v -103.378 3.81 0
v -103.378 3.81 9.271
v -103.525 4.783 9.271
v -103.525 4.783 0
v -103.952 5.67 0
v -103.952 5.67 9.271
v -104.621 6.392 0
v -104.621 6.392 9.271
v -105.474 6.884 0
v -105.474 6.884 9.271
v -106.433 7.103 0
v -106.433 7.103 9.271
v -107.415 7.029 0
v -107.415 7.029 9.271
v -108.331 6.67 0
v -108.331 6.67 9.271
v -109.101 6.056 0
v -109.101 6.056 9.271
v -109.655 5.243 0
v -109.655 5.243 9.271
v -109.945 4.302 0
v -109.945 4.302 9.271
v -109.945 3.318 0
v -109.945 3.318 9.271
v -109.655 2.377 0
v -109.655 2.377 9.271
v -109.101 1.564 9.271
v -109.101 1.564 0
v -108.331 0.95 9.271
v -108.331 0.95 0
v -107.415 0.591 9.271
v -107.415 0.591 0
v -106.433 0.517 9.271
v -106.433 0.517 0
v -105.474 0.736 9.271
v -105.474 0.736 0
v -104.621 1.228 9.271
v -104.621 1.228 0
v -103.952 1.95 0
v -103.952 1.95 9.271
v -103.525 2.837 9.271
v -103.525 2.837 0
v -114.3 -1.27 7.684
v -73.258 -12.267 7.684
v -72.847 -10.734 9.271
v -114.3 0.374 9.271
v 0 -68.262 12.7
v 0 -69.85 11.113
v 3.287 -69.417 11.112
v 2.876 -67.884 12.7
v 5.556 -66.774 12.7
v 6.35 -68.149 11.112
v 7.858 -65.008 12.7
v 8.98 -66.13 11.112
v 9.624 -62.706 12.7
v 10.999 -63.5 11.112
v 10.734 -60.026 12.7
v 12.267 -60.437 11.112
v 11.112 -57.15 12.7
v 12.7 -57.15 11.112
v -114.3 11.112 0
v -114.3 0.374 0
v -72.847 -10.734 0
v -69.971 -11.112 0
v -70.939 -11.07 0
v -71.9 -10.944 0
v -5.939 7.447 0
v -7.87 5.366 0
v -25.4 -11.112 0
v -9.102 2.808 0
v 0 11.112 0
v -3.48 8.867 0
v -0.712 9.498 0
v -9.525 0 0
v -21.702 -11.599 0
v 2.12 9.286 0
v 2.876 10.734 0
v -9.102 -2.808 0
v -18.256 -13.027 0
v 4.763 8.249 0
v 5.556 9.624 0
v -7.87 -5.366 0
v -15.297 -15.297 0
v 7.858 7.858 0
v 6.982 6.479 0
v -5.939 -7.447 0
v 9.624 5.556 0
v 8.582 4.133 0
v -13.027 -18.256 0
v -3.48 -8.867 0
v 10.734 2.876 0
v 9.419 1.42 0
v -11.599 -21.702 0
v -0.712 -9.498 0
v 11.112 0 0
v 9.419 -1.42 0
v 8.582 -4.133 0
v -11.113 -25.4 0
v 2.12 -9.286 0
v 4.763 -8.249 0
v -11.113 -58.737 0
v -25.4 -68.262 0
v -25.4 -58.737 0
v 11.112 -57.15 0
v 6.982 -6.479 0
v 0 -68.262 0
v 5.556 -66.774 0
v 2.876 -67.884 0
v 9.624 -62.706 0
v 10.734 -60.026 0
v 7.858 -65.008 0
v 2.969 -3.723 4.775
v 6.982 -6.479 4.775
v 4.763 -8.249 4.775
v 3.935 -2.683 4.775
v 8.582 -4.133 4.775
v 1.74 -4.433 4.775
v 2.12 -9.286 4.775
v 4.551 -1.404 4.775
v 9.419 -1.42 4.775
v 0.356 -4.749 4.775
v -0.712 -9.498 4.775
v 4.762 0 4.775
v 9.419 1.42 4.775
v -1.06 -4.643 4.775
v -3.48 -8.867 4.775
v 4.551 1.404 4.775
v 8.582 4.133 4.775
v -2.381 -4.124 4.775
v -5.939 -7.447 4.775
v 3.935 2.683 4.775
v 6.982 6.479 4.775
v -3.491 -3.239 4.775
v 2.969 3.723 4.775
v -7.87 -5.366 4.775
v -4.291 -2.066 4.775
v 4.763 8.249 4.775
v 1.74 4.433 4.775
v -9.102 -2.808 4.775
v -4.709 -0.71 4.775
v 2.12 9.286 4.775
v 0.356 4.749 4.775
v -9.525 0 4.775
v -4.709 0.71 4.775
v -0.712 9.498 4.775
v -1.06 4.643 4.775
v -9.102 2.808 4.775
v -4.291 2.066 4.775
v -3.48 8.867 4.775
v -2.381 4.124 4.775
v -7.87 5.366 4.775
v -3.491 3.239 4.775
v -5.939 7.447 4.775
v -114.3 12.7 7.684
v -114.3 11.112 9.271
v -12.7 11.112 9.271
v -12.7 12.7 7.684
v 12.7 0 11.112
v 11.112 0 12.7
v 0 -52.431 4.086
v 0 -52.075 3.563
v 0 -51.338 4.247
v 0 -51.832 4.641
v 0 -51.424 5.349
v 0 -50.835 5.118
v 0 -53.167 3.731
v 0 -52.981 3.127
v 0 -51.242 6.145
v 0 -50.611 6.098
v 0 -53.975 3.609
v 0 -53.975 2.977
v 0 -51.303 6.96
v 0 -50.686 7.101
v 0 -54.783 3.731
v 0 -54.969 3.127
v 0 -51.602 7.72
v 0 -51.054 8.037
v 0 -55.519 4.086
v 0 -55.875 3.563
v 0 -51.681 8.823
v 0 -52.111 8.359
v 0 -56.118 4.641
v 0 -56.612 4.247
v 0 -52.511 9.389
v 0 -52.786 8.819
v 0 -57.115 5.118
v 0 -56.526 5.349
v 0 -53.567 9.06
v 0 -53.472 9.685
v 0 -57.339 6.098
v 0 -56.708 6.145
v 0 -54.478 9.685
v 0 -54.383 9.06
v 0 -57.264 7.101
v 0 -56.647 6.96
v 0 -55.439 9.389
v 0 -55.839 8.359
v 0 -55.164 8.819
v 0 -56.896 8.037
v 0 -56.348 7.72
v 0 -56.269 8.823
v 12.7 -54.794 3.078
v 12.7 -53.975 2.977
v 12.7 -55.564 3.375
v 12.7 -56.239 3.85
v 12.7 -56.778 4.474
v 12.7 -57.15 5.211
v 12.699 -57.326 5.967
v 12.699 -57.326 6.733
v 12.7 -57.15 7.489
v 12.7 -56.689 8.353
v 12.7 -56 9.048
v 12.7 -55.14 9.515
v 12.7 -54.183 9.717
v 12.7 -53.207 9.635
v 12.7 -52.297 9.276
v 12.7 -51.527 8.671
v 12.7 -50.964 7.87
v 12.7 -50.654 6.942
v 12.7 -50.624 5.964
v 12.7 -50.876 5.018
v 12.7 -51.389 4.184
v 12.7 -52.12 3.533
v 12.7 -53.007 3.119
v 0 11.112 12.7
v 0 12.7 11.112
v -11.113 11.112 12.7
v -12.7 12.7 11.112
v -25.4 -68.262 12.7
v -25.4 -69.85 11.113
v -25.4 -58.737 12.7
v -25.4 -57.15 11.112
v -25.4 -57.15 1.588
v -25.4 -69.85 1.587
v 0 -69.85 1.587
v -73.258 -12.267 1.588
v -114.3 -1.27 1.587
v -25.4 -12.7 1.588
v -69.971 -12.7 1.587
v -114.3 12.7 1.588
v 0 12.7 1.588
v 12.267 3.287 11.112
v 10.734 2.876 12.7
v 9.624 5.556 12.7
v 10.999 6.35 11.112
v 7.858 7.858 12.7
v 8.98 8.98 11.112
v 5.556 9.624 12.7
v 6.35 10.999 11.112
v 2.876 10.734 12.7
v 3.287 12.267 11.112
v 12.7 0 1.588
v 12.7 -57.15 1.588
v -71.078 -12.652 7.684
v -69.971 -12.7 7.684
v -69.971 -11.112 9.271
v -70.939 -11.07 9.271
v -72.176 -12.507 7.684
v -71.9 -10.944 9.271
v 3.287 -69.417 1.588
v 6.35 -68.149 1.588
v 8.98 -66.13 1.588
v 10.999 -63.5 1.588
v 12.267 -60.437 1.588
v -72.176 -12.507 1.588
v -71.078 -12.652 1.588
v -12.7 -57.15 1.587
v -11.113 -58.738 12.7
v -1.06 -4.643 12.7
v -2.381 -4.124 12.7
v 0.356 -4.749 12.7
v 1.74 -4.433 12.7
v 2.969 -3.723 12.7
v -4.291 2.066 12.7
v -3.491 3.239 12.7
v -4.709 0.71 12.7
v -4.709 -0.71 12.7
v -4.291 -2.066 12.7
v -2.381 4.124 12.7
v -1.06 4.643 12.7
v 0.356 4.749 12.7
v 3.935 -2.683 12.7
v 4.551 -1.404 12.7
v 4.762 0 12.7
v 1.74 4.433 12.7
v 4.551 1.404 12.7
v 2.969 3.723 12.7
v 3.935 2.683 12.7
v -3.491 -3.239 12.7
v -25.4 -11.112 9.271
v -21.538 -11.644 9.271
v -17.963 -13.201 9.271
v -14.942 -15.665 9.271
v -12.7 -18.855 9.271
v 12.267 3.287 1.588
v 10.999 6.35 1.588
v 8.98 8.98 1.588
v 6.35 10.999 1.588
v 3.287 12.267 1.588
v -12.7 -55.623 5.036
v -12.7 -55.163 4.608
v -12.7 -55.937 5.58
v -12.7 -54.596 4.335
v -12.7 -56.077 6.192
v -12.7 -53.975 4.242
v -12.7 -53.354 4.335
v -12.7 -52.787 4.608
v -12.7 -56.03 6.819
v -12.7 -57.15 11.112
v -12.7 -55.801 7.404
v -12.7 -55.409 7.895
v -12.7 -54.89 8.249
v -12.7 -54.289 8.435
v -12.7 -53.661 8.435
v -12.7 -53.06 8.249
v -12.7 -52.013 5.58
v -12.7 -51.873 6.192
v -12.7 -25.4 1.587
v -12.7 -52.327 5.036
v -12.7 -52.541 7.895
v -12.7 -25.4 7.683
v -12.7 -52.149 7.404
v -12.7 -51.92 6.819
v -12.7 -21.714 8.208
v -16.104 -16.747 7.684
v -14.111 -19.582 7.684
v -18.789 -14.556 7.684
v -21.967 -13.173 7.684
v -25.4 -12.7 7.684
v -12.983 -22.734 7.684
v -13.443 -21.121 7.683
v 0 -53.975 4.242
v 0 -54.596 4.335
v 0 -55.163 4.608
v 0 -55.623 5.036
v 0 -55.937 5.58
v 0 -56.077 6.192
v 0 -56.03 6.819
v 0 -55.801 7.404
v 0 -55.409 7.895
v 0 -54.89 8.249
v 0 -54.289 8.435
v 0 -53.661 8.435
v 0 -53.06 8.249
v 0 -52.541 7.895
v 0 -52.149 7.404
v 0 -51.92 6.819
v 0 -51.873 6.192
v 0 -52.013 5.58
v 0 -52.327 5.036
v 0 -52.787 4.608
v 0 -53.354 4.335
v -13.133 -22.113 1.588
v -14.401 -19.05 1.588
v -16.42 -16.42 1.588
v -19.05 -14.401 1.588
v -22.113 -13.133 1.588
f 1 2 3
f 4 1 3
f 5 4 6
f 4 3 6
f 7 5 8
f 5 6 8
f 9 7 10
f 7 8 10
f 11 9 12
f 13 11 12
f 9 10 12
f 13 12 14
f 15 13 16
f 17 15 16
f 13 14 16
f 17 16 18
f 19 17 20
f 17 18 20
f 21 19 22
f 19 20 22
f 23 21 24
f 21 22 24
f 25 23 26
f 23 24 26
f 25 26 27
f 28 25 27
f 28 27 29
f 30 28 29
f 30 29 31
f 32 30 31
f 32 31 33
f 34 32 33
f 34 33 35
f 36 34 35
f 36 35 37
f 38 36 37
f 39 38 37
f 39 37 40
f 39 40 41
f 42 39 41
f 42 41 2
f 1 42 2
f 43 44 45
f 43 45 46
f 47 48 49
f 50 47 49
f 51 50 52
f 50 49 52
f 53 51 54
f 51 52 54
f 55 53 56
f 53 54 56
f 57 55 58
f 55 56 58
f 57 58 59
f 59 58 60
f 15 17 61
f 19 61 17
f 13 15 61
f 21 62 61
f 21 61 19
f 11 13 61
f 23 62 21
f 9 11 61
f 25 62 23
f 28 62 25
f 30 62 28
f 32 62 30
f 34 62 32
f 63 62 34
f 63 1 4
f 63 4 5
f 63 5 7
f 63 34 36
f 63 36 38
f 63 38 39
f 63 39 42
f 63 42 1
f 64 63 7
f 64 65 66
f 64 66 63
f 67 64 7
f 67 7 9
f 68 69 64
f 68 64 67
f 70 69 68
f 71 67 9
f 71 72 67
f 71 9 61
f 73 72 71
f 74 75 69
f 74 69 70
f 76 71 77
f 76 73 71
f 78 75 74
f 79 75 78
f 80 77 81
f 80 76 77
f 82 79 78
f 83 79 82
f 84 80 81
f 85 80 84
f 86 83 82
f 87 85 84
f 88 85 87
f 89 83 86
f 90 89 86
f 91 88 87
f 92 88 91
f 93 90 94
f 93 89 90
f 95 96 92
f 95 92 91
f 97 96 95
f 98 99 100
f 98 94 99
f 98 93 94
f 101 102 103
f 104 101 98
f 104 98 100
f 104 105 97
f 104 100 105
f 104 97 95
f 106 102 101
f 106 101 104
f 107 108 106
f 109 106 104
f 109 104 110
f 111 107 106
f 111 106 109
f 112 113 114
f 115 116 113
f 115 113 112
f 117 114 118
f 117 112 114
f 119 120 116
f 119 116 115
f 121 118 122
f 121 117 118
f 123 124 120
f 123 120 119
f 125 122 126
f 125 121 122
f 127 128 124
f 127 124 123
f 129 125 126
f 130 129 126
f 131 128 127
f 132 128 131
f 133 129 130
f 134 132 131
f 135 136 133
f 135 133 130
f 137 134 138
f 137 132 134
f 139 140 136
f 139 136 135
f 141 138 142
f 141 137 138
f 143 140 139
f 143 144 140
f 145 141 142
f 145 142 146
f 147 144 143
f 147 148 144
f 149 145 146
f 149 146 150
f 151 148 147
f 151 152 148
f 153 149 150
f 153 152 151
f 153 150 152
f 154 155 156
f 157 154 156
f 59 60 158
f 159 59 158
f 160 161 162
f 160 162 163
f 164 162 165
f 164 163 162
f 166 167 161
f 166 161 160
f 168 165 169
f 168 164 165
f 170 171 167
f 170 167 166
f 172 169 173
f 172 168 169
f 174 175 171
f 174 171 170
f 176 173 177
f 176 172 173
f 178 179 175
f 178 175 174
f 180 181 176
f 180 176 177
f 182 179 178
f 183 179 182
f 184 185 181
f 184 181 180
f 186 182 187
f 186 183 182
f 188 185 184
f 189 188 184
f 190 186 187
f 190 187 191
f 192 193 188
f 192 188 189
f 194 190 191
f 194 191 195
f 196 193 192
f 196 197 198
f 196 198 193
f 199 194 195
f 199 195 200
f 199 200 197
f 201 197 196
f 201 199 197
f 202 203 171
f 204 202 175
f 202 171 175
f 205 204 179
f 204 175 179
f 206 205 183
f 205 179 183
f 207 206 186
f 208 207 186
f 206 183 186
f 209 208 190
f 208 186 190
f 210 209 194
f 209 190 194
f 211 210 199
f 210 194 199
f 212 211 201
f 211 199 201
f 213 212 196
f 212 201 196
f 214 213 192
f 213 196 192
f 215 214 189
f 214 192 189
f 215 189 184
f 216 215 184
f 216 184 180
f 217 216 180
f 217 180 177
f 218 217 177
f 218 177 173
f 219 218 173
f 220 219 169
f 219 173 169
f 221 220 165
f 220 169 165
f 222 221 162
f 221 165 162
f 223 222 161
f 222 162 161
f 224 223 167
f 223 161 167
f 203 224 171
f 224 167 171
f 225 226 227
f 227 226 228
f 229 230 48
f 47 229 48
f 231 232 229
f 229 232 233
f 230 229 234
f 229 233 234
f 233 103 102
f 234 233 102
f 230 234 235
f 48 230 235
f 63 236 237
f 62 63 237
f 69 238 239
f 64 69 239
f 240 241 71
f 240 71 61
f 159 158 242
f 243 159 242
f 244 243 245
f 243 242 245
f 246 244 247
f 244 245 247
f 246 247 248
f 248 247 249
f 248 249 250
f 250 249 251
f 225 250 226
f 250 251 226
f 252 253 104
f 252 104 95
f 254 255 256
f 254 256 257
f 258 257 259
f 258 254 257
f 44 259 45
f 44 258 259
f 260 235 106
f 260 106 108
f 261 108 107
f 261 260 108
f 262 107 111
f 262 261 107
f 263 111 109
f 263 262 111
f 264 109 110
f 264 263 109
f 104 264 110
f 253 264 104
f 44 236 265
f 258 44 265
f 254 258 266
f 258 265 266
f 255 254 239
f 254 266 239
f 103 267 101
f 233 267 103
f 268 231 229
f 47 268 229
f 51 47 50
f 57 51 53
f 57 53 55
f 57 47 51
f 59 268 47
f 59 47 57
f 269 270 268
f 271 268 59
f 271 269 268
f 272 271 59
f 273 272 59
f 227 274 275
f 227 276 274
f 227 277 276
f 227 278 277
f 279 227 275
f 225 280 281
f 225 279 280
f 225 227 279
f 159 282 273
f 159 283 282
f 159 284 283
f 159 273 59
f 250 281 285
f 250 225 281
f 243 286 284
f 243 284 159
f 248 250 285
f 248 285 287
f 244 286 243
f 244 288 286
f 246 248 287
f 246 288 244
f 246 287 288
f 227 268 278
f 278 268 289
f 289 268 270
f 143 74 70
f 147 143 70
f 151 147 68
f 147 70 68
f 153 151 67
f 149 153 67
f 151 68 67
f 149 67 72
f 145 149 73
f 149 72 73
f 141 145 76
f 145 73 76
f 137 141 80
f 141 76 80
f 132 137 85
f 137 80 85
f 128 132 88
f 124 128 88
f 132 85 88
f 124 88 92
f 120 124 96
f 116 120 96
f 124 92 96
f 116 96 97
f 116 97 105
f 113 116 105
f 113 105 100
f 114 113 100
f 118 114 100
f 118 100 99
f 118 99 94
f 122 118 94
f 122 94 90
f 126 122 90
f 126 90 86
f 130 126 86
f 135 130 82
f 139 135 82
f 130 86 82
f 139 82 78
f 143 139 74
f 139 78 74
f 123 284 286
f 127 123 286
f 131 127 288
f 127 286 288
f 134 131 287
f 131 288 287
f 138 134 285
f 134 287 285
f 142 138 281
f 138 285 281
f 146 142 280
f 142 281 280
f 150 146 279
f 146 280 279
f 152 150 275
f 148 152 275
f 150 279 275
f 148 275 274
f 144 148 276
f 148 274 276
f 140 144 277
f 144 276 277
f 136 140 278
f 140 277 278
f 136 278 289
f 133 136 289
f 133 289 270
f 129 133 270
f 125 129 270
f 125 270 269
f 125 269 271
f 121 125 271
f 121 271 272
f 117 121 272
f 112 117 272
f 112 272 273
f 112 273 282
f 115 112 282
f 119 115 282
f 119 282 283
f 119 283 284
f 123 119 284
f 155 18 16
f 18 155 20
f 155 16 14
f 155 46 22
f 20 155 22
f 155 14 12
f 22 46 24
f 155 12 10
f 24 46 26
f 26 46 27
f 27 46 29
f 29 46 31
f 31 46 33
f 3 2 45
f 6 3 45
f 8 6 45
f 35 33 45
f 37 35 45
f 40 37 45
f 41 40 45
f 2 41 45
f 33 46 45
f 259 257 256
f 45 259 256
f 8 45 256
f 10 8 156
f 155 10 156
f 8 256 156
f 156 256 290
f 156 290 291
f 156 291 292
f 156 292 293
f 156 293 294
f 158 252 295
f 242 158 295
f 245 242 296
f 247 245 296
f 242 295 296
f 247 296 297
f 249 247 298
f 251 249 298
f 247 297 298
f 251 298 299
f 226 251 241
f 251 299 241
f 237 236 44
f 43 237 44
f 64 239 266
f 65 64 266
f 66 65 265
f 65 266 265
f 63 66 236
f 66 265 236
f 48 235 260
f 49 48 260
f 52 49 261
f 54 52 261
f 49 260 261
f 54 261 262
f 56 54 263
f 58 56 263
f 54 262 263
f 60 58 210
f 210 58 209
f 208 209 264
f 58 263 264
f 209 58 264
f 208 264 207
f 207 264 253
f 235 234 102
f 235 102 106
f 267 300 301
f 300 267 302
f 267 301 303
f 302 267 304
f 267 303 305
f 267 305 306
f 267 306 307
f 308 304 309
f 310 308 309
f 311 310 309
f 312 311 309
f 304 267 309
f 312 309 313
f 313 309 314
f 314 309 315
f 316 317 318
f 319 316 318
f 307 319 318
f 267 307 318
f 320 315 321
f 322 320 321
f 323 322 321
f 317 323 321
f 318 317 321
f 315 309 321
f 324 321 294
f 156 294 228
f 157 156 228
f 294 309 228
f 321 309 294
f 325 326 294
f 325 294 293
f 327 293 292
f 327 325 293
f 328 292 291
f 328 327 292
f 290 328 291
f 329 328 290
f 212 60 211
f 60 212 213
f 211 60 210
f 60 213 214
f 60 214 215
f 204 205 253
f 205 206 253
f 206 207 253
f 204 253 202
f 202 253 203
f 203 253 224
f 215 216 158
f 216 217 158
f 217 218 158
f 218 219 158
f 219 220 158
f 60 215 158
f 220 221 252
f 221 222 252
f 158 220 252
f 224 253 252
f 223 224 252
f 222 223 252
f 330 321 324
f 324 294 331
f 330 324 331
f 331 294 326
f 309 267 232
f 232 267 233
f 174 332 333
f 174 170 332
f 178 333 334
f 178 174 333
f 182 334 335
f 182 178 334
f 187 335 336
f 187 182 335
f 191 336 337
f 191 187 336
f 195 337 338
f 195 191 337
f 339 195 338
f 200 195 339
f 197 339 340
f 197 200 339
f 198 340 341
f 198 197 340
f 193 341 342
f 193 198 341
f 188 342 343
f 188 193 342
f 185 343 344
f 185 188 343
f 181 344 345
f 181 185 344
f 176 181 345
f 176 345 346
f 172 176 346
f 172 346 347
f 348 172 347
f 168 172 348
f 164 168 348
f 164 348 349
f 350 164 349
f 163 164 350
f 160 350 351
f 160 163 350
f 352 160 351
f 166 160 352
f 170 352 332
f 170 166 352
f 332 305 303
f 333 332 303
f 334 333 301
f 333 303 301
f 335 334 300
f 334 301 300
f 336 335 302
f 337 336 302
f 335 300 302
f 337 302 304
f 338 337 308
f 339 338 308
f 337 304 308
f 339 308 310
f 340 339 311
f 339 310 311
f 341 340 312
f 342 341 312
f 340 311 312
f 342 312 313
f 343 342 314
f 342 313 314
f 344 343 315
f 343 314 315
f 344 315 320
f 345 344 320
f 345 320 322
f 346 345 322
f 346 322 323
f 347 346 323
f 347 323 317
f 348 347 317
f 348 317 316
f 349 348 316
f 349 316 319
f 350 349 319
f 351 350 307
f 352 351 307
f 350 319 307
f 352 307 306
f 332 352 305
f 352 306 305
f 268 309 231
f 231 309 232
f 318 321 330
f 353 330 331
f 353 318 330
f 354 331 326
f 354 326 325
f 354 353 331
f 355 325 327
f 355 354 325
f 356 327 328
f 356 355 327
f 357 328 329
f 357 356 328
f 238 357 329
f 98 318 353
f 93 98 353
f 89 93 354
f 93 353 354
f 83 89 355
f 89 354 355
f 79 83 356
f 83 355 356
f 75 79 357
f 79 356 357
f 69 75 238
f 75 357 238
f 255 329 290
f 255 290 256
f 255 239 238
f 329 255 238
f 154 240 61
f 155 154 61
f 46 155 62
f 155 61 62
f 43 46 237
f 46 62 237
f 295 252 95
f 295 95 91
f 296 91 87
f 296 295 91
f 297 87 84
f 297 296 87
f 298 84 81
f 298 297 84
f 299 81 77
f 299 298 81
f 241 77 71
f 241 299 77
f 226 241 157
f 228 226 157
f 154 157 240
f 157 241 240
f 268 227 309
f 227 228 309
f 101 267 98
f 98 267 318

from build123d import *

# Parameters (mm, degrees)
BASE_EXTRUDE_DEPTH = 12.7
SKETCH2_R          = 4.7625
CUT_EXTRUDE1_DEPTH = 135.554087638
SKETCH3_R          = 3.302
CUT_EXTRUDE2_DEPTH = 106.159296474
CHAMFER1_SIZE      = 11.43
CHAMFER1_SIZE2     = 42.657340731
SKETCH5_W          = 101.6
SKETCH5_H          = 25.4
CUT_EXTRUDE4_DEPTH = 3.429
FILLET2_R          = 12.7
CHAMFER2_SIZE      = 1.5875
CHAMFER3_SIZE      = 1.5875
SKETCH8_R          = 9.525
CUT_EXTRUDE5_DEPTH = 4.7752


with BuildPart() as part:
    # Sketch1 → Base-Extrude (new body)
    with BuildSketch(Plane.XY):
        Polygon((-114.3, 12.7), (-114.3, -12.7), (-12.7, -12.7), (-12.7, -57.15), (-25.4, -57.15), (-25.4, -69.85), (12.7, -69.85), (12.7, 12.7), align=None)
    extrude(amount=BASE_EXTRUDE_DEPTH)

    # Sketch2 → Cut-Extrude1 (cut, through all)
    with BuildSketch(Plane.XY.offset(12.7)):
        Circle(SKETCH2_R)
    extrude(amount=-CUT_EXTRUDE1_DEPTH, mode=Mode.SUBTRACT)

    # Sketch3 → Cut-Extrude2 (cut, through all)
    with BuildSketch(Plane(origin=(-40.826123223, 4.303739396, 12.7), x_dir=(1, 0, 0), z_dir=(0, 0, 1))):
        with Locations((-65.853876777, -0.493739396)):
            Circle(SKETCH3_R)
    extrude(amount=-CUT_EXTRUDE2_DEPTH, mode=Mode.SUBTRACT)

    # Chamfer1
    chamfer1_edges = [part.edges().sort_by_distance(p)[0] for p in [
        (-114.3, -12.7, 6.35),
    ]]
    chamfer1_side = [part.faces().sort_by_distance(p)[0] for p in [
        (-114.3, 0, 6.35),
    ]]
    chamfer(chamfer1_edges, length=CHAMFER1_SIZE, length2=CHAMFER1_SIZE2, reference=chamfer1_side[0])

    # Sketch5 → Cut-Extrude4 (cut)
    with BuildSketch(Plane(origin=(-65.557986772, -0.200650606, 12.7), x_dir=(1, 0, 0), z_dir=(0, 0, 1))):
        with Locations((2.057986772, 0.200650606)):
            Rectangle(SKETCH5_W, SKETCH5_H)
    extrude(amount=-CUT_EXTRUDE4_DEPTH, mode=Mode.SUBTRACT)

    # Sketch7 → Hole1 (revolve, cut)
    with BuildSketch(Plane(origin=(12.7, -53.975, 6.35), x_dir=(0, 0, -1), z_dir=(0, 1, 0))):
        Polygon((0, 0), (0, 127), (2.108198174, 127), (2.108198174, 126.997460002), (2.108198174, 12.699989143), (2.740657626, 12.699989), (3.373117078, 12.699989), (3.373117078, 6.3499945), (3.373117078, 0), align=None)
    revolve(axis=Axis((12.7, -53.975, 6.35), (-1, 0, 0)), mode=Mode.SUBTRACT)

    # Fillet2
    # the kernel refuses this fillet: 12.7 mm, written as the material it adds along each edge
    with BuildSketch(Plane(origin=(-12.7, -12.7, 0), x_dir=(-1, 0, 0), z_dir=(0, 0, 1))) as fillet2_piece_1:
        with BuildLine():
            CenterArc((FILLET2_R, FILLET2_R), FILLET2_R, 180, 90)
            Line((0, FILLET2_R), (0, 0))
            Line((0, 0), (FILLET2_R, 0))
        make_face()
    extrude(amount=9.271)
    # the kernel refuses this fillet: 12.7 mm, written as the material it takes off along each edge
    with BuildSketch(Plane(origin=(12.7, 12.7, -31.75), x_dir=(0, -1, 0), z_dir=(0, 0, 1))) as fillet2_2_piece_1:
        with BuildLine():
            CenterArc((FILLET2_R, -FILLET2_R), FILLET2_R, 90, 90)
            Line((0, -FILLET2_R), (0, 0))
            Line((0, 0), (FILLET2_R, 0))
        make_face()
    extrude(amount=76.2, mode=Mode.SUBTRACT)
    with BuildSketch(Plane(origin=(12.7, -69.85, -31.75), x_dir=(0, 1, 0), z_dir=(0, 0, 1))) as fillet2_2_piece_2:
        with BuildLine():
            CenterArc((FILLET2_R, FILLET2_R), FILLET2_R, 180, 90)
            Line((0, FILLET2_R), (0, 0))
            Line((0, 0), (FILLET2_R, 0))
        make_face()
    extrude(amount=76.2, mode=Mode.SUBTRACT)
    with BuildSketch(Plane(origin=(-71.642659269, -12.7, -4.179966798), x_dir=(1, 0, 0), z_dir=(0, 0, 1))) as fillet2_2_piece_3:
        with BuildLine():
            CenterArc((FILLET2_R * 0.131652497587, FILLET2_R), FILLET2_R, 255, 15)
            Line((-FILLET2_R * 0.127166547515, FILLET2_R * 0.0340741737109), (0, 0))
            Line((0, 0), (FILLET2_R * 0.131652497587, 0))
        make_face()
    extrude(amount=17.630933597, mode=Mode.SUBTRACT)

    # Chamfer2
    chamfer2_edges = [part.edges().sort_by_distance(p)[0] for p in [
        (-57.15, 12.7, 0),
        (12.7, -28.575, 0),
        (-12.7, -69.85, 0),
        (8.980256121, -66.130256121, 0),
        (8.980256121, 8.980256121, 0),
    ]]
    chamfer(chamfer2_edges, length=CHAMFER2_SIZE)

    # Chamfer3
    chamfer3_edges = [part.edges().sort_by_distance(p)[0] for p in [
        (-19.05, -57.15, 0),
    ]]
    chamfer(chamfer3_edges, length=CHAMFER3_SIZE)
    chamfer3_2_edges = [part.edges().sort_by_distance(p)[0] for p in [
        (-12.7, -41.275, 0),
        (-16.419743879, -16.419743879, 0),
        (-47.685336275, -12.7, 0),
        (-71.628355191, -12.591349739, 0),
        (-93.778837211, -6.768628997, 0),
    ]]
    chamfer(chamfer3_2_edges, length=CHAMFER3_SIZE)
    chamfer3_3_edges = [part.edges().sort_by_distance(p)[0] for p in [
        (-19.05, -57.15, 12.7),
    ]]
    chamfer(chamfer3_3_edges, length=CHAMFER3_SIZE)
    chamfer3_4_edges = [part.edges().sort_by_distance(p)[0] for p in [
        (-12.7, -22.225, 12.7),
    ]]
    chamfer(chamfer3_4_edges, length=CHAMFER3_SIZE)
    chamfer3_5_edges = [part.edges().sort_by_distance(p)[0] for p in [
        (-16.419743879, -16.419743879, 9.271),
        (-47.685336275, -12.7, 9.271),
        (-71.628355191, -12.591349739, 9.271),
        (-93.778837211, -6.768628997, 9.271),
    ]]
    chamfer(chamfer3_5_edges, length=CHAMFER3_SIZE)
    chamfer3_6_edges = [part.edges().sort_by_distance(p)[0] for p in [
        (-12.7, -69.85, 12.7),
        (8.980256121, 8.980256121, 12.7),
        (12.7, -28.575, 12.7),
        (8.980256121, -66.130256121, 12.7),
        (-5.55625, 12.7, 12.7),
    ]]
    chamfer(chamfer3_6_edges, length=CHAMFER3_SIZE)
    chamfer3_7_edges = [part.edges().sort_by_distance(p)[0] for p in [
        (-63.5, 12.7, 9.271),
    ]]
    chamfer(chamfer3_7_edges, length=CHAMFER3_SIZE)

    # Sketch8 → Cut-Extrude5 (cut)
    with BuildSketch(Plane(origin=(0, 0, 0), x_dir=(-1, 0, 0), z_dir=(0, 0, -1))):
        Circle(SKETCH8_R)
    extrude(amount=-CUT_EXTRUDE5_DEPTH, mode=Mode.SUBTRACT)


solid = part.part
